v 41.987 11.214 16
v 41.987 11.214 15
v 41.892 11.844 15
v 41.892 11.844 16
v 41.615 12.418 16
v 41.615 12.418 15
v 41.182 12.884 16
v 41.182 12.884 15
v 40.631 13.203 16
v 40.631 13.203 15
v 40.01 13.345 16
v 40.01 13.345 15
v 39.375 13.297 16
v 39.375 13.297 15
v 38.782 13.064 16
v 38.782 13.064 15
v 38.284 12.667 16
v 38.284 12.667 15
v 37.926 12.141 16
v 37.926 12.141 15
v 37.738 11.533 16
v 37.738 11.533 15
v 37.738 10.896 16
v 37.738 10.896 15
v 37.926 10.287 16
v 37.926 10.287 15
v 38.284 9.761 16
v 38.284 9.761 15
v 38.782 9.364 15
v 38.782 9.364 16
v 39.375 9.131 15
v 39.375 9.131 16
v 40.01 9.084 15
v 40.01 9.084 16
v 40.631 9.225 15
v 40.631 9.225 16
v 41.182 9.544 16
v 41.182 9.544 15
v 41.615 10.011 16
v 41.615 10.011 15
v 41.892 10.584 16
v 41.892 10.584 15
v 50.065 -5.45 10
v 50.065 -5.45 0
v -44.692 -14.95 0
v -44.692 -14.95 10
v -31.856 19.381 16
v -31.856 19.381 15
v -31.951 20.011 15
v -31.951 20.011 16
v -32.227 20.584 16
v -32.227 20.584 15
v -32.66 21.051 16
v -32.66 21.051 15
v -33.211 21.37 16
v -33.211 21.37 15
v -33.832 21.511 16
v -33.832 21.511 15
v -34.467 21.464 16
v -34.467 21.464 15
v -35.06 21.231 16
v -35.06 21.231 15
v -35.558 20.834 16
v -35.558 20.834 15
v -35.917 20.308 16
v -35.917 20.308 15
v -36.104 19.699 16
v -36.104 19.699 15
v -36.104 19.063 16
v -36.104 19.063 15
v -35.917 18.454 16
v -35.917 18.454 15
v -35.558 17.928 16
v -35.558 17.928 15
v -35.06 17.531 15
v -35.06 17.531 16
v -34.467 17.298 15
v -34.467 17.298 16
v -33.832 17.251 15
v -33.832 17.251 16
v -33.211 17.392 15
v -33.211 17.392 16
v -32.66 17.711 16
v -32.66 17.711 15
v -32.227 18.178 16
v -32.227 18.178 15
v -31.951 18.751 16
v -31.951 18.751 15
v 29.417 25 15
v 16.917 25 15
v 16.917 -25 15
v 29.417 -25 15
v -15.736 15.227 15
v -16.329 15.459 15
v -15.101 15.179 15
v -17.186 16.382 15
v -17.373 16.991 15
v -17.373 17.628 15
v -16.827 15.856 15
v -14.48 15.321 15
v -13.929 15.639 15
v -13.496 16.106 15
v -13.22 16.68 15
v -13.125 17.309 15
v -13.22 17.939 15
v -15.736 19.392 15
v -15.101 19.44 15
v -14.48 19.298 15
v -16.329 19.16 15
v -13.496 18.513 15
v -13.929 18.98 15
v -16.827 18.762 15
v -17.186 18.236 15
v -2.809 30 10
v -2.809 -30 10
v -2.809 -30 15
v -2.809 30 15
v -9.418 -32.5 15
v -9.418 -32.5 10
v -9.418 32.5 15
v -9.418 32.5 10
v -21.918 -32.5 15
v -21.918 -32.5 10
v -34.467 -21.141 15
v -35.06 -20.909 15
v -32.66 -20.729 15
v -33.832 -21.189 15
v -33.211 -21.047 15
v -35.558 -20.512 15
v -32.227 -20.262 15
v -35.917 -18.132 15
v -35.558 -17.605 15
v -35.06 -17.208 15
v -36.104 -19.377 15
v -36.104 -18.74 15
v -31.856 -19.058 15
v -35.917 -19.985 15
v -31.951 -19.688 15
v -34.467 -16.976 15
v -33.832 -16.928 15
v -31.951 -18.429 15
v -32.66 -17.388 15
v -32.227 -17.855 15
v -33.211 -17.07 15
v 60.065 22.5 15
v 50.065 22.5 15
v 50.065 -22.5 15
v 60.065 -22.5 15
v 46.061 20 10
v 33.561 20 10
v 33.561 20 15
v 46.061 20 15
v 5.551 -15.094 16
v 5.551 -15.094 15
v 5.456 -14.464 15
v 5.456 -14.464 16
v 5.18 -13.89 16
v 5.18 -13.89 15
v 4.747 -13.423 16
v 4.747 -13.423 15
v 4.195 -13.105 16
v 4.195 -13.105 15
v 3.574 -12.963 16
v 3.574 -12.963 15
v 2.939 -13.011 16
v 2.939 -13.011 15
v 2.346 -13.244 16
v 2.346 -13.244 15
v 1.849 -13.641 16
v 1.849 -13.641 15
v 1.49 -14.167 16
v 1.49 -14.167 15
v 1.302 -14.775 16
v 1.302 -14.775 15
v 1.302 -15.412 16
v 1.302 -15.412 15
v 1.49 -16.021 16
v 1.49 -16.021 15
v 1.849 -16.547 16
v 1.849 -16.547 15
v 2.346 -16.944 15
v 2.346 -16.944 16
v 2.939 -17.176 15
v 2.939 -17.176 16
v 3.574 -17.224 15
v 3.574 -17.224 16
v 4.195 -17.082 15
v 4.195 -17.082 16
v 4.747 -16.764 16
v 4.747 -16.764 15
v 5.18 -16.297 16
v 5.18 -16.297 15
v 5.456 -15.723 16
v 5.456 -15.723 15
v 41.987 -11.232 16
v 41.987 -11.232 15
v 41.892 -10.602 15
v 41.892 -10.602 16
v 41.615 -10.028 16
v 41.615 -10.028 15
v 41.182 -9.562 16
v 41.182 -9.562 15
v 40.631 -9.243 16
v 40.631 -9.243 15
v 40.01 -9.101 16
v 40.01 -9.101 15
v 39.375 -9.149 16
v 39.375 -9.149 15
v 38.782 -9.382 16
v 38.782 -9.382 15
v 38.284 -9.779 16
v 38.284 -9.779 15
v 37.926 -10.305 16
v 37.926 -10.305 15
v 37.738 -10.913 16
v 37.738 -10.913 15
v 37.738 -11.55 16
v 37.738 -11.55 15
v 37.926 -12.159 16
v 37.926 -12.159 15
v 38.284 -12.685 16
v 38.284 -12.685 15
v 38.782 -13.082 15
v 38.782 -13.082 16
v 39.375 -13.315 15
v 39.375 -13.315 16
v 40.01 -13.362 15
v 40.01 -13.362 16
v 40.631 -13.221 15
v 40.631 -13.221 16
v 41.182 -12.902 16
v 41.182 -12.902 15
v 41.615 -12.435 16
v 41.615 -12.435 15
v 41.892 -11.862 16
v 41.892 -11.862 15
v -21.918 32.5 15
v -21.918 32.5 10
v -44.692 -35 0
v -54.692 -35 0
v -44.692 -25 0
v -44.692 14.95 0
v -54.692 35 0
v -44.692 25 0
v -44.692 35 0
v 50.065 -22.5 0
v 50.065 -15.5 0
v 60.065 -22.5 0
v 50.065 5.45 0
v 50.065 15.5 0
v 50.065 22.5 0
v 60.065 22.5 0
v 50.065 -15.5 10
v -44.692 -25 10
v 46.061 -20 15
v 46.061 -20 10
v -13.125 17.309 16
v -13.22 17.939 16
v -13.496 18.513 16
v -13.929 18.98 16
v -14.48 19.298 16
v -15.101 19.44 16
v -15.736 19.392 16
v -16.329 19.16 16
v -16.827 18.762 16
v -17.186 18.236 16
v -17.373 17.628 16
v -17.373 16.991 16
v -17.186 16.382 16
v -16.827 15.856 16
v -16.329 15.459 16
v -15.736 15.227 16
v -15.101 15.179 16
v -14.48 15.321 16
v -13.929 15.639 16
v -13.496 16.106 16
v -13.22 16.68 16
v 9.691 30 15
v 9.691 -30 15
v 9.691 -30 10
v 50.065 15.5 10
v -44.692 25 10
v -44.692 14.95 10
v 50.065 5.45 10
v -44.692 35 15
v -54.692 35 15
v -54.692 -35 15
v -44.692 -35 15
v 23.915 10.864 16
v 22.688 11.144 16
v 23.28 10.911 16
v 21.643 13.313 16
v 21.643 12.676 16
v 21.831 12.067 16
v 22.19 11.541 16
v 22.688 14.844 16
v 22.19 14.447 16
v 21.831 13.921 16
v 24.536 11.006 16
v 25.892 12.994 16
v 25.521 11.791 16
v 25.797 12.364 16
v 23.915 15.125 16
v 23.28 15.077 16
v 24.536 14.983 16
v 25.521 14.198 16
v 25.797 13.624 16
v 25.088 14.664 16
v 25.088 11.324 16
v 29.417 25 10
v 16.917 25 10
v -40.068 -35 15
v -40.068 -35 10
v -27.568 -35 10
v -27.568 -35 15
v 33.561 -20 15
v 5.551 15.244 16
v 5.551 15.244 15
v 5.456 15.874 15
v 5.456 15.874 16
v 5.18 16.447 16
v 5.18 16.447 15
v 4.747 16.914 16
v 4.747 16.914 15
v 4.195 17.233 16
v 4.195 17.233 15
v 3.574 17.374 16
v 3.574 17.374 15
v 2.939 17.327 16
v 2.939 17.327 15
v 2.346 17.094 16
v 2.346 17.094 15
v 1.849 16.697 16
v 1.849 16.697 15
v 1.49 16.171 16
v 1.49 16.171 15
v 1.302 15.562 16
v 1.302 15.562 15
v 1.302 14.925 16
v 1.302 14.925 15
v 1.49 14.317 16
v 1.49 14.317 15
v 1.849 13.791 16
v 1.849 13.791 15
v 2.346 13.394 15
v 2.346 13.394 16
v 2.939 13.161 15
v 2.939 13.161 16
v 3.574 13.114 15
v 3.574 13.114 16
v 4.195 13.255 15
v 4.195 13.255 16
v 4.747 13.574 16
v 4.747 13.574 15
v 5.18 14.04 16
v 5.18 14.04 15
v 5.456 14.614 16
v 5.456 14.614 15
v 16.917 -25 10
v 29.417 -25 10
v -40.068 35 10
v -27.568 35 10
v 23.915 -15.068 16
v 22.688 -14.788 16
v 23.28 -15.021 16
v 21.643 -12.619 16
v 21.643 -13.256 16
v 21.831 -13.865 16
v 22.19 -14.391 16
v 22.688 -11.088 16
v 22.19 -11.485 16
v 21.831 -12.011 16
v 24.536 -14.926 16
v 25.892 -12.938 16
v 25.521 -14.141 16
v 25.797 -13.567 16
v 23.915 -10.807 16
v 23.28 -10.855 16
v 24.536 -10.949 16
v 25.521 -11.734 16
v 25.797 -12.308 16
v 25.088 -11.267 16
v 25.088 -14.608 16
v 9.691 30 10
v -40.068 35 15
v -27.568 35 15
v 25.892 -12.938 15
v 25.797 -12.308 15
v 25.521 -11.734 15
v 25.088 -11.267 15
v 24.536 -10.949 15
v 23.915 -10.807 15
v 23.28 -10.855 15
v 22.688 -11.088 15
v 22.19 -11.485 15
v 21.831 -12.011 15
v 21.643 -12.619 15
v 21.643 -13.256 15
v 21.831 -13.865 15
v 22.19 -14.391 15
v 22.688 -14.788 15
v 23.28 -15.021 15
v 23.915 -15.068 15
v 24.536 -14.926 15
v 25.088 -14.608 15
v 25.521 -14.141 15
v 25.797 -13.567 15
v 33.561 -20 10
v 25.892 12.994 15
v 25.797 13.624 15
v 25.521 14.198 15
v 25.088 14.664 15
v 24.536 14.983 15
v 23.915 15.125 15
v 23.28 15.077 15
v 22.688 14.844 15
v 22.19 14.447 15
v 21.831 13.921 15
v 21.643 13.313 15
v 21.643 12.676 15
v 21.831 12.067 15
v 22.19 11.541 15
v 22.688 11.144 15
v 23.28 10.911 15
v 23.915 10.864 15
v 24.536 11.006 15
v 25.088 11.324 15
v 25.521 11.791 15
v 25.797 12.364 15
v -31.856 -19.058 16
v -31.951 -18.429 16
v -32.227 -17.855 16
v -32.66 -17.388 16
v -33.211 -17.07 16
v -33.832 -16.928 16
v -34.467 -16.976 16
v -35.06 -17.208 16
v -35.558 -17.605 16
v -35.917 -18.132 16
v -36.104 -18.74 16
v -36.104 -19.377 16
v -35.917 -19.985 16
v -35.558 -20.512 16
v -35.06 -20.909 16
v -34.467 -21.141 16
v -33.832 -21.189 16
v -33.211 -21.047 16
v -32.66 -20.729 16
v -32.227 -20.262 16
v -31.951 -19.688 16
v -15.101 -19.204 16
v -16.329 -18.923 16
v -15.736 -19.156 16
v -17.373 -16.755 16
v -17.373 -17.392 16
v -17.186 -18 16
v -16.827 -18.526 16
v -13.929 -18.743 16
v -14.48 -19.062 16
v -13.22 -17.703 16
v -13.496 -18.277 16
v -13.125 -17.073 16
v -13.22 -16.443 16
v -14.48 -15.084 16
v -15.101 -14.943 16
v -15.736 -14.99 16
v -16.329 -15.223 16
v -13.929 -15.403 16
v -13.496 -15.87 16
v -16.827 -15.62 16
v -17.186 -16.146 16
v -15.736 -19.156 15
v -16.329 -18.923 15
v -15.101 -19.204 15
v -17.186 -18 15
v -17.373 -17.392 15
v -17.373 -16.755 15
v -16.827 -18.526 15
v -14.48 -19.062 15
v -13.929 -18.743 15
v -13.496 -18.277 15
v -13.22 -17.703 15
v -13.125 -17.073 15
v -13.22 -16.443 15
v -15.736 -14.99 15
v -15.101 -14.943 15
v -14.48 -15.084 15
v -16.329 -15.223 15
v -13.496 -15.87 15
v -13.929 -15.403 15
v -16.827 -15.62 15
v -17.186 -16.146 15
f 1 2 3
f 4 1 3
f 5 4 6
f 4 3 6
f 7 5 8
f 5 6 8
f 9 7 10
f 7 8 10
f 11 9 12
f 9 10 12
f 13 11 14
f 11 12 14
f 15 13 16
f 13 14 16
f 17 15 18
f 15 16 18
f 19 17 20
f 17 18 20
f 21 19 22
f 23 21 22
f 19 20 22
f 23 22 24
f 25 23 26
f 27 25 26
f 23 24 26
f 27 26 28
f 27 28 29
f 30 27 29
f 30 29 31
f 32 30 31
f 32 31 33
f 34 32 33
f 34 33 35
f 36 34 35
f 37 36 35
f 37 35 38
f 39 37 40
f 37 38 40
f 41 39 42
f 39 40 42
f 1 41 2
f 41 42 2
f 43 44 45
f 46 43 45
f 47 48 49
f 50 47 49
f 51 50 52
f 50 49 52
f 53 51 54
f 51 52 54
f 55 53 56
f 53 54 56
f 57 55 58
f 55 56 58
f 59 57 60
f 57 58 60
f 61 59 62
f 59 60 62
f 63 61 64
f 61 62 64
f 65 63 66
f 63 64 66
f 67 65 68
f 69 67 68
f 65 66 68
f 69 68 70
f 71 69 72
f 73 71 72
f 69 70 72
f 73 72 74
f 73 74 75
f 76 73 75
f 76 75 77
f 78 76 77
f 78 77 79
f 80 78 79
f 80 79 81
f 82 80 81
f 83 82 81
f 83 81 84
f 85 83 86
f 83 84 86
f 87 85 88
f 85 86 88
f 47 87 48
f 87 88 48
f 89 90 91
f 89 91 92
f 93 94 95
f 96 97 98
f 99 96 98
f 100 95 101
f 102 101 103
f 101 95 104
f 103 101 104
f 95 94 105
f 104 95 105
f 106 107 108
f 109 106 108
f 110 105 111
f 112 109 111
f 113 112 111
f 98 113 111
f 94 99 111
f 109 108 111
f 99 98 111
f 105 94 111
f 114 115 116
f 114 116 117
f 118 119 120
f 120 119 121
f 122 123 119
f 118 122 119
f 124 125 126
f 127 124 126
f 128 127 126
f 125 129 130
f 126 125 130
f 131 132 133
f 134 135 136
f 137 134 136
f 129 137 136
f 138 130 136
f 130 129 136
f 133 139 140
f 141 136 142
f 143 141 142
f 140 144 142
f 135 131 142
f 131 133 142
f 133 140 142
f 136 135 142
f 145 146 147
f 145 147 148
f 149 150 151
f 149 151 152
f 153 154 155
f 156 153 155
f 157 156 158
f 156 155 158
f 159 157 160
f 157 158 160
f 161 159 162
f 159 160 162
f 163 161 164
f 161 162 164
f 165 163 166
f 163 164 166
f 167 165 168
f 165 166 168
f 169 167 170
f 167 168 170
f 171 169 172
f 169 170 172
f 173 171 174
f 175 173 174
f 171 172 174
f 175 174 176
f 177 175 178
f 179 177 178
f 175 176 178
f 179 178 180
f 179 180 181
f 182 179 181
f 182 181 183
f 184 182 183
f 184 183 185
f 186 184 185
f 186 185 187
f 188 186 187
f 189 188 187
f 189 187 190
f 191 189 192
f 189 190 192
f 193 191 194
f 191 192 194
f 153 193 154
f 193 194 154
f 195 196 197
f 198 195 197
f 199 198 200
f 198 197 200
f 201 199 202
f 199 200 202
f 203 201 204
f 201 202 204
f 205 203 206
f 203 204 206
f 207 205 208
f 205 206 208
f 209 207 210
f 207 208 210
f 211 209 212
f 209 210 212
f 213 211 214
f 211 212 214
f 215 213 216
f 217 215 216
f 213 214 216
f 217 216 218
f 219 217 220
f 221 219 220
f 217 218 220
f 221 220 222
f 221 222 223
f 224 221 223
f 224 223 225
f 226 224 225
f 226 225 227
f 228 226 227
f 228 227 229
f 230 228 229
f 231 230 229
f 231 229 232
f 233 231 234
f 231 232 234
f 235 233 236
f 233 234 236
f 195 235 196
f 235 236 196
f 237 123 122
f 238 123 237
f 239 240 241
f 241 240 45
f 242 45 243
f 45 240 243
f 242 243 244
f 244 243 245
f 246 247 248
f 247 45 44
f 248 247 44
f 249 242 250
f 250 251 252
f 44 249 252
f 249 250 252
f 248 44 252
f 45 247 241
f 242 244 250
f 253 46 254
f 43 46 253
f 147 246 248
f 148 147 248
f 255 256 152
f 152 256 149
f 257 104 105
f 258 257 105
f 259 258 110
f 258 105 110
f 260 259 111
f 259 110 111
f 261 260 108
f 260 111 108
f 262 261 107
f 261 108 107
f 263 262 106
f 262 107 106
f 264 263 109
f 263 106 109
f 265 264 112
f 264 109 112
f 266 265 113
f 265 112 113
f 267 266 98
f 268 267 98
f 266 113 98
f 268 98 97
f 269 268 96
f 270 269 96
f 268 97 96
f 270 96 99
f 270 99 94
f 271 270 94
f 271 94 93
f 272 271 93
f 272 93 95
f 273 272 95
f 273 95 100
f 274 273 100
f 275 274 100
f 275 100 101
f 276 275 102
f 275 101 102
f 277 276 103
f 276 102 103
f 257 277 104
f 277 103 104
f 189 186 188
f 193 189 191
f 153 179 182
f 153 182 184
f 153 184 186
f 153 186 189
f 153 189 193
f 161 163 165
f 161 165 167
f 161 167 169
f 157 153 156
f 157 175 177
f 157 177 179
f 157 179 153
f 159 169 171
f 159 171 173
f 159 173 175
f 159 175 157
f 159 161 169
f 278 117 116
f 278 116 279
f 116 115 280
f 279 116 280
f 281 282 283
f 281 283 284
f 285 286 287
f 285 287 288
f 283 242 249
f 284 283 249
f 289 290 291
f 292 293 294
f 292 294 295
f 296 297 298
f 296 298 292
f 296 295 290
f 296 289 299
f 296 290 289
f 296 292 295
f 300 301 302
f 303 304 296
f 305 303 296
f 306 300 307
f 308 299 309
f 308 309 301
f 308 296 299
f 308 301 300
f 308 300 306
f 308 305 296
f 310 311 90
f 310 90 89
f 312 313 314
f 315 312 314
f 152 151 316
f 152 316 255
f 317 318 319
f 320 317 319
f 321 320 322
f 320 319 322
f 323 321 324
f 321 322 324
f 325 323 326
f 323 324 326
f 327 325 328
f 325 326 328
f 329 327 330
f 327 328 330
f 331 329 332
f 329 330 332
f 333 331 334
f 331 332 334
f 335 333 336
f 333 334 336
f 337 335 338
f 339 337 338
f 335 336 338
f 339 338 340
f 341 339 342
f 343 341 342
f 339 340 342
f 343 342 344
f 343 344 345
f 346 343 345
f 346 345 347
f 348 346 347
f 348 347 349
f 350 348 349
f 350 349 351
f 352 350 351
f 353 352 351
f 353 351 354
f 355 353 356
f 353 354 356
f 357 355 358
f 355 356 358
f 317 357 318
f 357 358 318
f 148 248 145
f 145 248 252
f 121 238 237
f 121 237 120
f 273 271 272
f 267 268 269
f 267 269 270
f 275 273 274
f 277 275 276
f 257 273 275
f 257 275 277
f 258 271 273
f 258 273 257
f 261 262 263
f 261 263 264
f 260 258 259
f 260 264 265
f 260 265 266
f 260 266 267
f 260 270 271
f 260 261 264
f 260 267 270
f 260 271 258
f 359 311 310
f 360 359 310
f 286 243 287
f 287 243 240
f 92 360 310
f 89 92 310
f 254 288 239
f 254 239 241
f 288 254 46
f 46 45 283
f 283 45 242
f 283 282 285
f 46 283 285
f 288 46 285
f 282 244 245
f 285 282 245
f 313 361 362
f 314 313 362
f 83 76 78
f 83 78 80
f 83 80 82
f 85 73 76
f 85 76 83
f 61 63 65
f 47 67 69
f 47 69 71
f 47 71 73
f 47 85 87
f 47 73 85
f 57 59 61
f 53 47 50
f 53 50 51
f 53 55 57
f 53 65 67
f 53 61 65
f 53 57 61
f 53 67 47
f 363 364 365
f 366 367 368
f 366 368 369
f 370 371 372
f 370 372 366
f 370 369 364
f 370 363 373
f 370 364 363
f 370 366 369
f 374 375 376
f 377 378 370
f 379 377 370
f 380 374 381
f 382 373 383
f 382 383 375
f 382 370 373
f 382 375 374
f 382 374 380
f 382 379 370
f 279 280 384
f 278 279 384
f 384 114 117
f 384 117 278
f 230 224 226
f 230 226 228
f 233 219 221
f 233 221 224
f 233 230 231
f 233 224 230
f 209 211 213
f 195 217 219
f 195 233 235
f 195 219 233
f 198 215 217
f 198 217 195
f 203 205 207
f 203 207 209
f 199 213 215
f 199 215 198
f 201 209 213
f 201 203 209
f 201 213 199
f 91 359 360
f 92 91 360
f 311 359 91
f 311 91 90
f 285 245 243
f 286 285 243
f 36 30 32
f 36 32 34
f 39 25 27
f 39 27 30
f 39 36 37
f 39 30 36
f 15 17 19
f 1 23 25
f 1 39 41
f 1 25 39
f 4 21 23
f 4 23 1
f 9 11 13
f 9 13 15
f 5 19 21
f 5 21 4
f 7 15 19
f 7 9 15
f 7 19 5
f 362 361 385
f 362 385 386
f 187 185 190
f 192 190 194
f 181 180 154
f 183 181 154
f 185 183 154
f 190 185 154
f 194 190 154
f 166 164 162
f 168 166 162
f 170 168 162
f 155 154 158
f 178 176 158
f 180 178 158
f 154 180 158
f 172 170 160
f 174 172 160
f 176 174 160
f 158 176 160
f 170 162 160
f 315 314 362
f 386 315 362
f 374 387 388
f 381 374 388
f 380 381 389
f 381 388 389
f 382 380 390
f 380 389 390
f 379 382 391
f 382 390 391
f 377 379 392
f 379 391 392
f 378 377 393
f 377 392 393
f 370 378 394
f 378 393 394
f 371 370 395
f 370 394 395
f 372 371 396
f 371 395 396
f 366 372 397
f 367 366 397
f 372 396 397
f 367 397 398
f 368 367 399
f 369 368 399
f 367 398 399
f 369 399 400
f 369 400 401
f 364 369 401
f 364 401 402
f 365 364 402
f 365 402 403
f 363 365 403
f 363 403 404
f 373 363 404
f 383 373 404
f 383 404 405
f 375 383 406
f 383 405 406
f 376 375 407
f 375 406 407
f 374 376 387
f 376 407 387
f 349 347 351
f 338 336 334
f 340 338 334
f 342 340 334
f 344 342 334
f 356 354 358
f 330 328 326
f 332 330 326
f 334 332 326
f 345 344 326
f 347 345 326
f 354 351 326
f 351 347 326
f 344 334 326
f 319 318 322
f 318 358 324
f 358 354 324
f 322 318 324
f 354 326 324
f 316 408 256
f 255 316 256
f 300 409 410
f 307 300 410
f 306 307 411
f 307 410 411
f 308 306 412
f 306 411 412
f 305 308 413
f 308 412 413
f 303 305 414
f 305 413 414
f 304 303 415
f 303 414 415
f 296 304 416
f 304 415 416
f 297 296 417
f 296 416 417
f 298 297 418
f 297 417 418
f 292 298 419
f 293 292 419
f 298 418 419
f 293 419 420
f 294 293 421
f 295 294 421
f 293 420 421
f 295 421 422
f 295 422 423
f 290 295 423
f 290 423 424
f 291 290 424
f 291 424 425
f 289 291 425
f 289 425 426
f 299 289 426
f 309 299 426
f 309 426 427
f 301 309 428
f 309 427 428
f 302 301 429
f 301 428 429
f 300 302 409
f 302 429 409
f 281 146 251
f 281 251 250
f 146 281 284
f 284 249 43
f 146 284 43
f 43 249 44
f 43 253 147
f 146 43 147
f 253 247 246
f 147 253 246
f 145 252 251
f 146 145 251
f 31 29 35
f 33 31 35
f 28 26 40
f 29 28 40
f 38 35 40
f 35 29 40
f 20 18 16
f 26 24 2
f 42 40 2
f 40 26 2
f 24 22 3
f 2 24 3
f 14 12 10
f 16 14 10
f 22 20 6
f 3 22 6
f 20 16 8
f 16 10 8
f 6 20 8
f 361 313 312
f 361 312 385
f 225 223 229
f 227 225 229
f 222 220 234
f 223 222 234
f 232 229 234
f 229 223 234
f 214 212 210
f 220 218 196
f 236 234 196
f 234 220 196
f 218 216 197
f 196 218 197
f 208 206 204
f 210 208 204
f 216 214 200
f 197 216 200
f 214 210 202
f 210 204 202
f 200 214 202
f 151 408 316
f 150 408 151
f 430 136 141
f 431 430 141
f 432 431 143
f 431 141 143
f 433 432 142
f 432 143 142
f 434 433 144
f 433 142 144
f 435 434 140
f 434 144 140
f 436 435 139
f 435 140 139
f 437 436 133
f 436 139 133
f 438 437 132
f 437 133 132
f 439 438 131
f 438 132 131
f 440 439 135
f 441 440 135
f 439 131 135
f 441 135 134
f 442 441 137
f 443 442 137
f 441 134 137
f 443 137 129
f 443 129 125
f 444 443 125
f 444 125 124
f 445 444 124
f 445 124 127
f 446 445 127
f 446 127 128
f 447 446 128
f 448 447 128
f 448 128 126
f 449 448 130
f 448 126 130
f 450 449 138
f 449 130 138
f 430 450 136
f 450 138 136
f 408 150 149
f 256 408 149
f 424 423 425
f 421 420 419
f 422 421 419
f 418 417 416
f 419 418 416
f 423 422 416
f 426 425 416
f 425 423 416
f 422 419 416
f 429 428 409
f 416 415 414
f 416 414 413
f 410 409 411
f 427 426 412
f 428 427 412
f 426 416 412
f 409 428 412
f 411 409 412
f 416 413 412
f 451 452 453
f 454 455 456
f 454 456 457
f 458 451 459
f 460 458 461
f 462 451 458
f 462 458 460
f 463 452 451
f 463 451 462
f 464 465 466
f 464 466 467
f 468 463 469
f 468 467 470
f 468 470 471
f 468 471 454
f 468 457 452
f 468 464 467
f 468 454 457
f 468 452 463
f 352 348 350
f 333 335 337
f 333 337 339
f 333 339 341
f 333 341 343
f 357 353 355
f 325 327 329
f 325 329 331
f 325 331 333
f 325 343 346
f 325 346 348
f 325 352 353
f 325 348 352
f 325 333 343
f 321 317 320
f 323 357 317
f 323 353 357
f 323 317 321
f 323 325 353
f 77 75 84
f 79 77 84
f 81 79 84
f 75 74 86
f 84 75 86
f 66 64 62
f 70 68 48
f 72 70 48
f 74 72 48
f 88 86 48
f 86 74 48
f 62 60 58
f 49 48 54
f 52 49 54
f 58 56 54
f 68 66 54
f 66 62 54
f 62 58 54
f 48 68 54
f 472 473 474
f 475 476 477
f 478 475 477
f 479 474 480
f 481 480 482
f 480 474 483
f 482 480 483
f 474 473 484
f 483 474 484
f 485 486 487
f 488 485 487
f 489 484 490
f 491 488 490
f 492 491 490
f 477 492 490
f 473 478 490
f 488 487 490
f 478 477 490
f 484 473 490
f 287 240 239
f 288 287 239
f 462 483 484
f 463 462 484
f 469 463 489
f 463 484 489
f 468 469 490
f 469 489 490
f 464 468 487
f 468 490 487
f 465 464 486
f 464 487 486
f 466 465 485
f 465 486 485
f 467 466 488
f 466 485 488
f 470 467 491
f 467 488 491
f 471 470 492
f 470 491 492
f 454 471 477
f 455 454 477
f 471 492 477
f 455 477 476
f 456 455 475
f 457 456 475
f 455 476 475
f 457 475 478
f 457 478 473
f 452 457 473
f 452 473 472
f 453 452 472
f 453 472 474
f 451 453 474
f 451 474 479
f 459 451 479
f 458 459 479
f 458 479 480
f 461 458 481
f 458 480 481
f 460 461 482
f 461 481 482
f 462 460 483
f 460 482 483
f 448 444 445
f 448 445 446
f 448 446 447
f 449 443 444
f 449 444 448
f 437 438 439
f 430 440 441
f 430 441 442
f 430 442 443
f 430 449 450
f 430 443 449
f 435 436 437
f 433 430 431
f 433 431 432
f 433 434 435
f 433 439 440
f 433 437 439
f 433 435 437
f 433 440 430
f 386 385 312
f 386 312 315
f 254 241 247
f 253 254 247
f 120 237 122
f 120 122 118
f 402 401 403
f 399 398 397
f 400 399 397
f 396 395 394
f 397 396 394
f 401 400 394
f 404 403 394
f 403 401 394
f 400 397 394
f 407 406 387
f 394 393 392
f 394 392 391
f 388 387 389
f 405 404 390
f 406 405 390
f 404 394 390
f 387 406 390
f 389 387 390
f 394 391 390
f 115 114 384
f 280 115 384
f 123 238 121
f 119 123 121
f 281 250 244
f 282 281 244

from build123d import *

# Parameters (mm, degrees)
F1_DEPTH = 15
F2_W     = 94.757164
F2_H     = 62.215524
F3_DEPTH = 5
F4_W     = 12.5
F4_H     = 70
F4_H_2   = 65
F4_H_3   = 50
F4_H_4   = 40
F4_H_5   = 60
F5_DEPTH = 5
F6_R     = 2.136343
F7_DEPTH = 1


with BuildPart() as f1:
    # F0 (on Top) → F1 (new body)
    with BuildSketch(Plane.XY):
        Polygon((-44.691786, 35), (-54.691786, 35), (-54.691786, -35), (-44.691786, -35), (-44.691786, -25), (-44.691786, -14.949869), (-44.691786, 14.949869), (-44.691786, 25), align=None)
        Polygon((50.065378, 15.5), (-44.691786, 25), (-44.691786, 14.949869), (50.065378, 5.449869), align=None)
        Polygon((50.065378, 22.5), (50.065378, 15.5), (50.065378, 5.449869), (50.065378, -5.449869), (50.065378, -15.5), (50.065378, -22.5), (60.065378, -22.5), (60.065378, 22.5), align=None)
        Polygon((-44.691786, -14.949869), (-44.691786, -25), (50.065378, -15.5), (50.065378, -5.449869), align=None)
    extrude(amount=F1_DEPTH)

    # F2 (on face) → F3 (cut)
    with BuildSketch(Plane.XY.offset(15)):
        with Locations((2.686796, -1.107762)):
            Rectangle(F2_W, F2_H)
        Polygon((50.065378, 30), (-44.691786, 30), (-44.691786, 25), (50.065378, 15.5), align=None)
        Polygon((50.065378, 15.5), (-44.691786, 25), (-44.691786, 14.949869), (50.065378, 5.449869), align=None)
        Polygon((50.065378, -5.449869), (-44.691786, -14.949869), (-44.691786, -32.215524), (50.065378, -32.215524), align=None)
    extrude(amount=-F3_DEPTH, mode=Mode.SUBTRACT)


with BuildPart() as f5:
    # F4 (on face) → F5 (new body)
    with BuildSketch(Plane.XY.offset(10)):
        with Locations((-33.818496, 0)):
            Rectangle(F4_W, F4_H)
        with Locations((-15.668441, 0)):
            Rectangle(F4_W, F4_H_2)
        with Locations((23.167173, 0)):
            Rectangle(F4_W, F4_H_3)
        with Locations((39.811006, 0)):
            Rectangle(F4_W, F4_H_4)
        with Locations((3.441142, 0)):
            Rectangle(F4_W, F4_H_5)
    extrude(amount=F5_DEPTH)


with BuildPart() as f7:
    # F6 (on face) → F7 (new body)
    with BuildSketch(Plane.XY.offset(15)):
        with Locations((-33.991949, 19.381031)):
            Circle(F6_R)
        with Locations((-15.260957, 17.3094)):
            Circle(F6_R)
        with Locations((23.755828, 12.99418)):
            Circle(F6_R)
        with Locations((39.850352, 11.214141)):
            Circle(F6_R)
        with Locations((3.414604, 15.243901)):
            Circle(F6_R)
        with Locations((-33.991949, -19.05846)):
            Circle(F6_R)
        with Locations((-15.260957, -17.073148)):
            Circle(F6_R)
        with Locations((3.414604, -15.093711)):
            Circle(F6_R)
        with Locations((23.755828, -12.937729)):
            Circle(F6_R)
        with Locations((39.850352, -11.231857)):
            Circle(F6_R)
    extrude(amount=F7_DEPTH)


solid = Compound([f1.part, f5.part, f7.part])
